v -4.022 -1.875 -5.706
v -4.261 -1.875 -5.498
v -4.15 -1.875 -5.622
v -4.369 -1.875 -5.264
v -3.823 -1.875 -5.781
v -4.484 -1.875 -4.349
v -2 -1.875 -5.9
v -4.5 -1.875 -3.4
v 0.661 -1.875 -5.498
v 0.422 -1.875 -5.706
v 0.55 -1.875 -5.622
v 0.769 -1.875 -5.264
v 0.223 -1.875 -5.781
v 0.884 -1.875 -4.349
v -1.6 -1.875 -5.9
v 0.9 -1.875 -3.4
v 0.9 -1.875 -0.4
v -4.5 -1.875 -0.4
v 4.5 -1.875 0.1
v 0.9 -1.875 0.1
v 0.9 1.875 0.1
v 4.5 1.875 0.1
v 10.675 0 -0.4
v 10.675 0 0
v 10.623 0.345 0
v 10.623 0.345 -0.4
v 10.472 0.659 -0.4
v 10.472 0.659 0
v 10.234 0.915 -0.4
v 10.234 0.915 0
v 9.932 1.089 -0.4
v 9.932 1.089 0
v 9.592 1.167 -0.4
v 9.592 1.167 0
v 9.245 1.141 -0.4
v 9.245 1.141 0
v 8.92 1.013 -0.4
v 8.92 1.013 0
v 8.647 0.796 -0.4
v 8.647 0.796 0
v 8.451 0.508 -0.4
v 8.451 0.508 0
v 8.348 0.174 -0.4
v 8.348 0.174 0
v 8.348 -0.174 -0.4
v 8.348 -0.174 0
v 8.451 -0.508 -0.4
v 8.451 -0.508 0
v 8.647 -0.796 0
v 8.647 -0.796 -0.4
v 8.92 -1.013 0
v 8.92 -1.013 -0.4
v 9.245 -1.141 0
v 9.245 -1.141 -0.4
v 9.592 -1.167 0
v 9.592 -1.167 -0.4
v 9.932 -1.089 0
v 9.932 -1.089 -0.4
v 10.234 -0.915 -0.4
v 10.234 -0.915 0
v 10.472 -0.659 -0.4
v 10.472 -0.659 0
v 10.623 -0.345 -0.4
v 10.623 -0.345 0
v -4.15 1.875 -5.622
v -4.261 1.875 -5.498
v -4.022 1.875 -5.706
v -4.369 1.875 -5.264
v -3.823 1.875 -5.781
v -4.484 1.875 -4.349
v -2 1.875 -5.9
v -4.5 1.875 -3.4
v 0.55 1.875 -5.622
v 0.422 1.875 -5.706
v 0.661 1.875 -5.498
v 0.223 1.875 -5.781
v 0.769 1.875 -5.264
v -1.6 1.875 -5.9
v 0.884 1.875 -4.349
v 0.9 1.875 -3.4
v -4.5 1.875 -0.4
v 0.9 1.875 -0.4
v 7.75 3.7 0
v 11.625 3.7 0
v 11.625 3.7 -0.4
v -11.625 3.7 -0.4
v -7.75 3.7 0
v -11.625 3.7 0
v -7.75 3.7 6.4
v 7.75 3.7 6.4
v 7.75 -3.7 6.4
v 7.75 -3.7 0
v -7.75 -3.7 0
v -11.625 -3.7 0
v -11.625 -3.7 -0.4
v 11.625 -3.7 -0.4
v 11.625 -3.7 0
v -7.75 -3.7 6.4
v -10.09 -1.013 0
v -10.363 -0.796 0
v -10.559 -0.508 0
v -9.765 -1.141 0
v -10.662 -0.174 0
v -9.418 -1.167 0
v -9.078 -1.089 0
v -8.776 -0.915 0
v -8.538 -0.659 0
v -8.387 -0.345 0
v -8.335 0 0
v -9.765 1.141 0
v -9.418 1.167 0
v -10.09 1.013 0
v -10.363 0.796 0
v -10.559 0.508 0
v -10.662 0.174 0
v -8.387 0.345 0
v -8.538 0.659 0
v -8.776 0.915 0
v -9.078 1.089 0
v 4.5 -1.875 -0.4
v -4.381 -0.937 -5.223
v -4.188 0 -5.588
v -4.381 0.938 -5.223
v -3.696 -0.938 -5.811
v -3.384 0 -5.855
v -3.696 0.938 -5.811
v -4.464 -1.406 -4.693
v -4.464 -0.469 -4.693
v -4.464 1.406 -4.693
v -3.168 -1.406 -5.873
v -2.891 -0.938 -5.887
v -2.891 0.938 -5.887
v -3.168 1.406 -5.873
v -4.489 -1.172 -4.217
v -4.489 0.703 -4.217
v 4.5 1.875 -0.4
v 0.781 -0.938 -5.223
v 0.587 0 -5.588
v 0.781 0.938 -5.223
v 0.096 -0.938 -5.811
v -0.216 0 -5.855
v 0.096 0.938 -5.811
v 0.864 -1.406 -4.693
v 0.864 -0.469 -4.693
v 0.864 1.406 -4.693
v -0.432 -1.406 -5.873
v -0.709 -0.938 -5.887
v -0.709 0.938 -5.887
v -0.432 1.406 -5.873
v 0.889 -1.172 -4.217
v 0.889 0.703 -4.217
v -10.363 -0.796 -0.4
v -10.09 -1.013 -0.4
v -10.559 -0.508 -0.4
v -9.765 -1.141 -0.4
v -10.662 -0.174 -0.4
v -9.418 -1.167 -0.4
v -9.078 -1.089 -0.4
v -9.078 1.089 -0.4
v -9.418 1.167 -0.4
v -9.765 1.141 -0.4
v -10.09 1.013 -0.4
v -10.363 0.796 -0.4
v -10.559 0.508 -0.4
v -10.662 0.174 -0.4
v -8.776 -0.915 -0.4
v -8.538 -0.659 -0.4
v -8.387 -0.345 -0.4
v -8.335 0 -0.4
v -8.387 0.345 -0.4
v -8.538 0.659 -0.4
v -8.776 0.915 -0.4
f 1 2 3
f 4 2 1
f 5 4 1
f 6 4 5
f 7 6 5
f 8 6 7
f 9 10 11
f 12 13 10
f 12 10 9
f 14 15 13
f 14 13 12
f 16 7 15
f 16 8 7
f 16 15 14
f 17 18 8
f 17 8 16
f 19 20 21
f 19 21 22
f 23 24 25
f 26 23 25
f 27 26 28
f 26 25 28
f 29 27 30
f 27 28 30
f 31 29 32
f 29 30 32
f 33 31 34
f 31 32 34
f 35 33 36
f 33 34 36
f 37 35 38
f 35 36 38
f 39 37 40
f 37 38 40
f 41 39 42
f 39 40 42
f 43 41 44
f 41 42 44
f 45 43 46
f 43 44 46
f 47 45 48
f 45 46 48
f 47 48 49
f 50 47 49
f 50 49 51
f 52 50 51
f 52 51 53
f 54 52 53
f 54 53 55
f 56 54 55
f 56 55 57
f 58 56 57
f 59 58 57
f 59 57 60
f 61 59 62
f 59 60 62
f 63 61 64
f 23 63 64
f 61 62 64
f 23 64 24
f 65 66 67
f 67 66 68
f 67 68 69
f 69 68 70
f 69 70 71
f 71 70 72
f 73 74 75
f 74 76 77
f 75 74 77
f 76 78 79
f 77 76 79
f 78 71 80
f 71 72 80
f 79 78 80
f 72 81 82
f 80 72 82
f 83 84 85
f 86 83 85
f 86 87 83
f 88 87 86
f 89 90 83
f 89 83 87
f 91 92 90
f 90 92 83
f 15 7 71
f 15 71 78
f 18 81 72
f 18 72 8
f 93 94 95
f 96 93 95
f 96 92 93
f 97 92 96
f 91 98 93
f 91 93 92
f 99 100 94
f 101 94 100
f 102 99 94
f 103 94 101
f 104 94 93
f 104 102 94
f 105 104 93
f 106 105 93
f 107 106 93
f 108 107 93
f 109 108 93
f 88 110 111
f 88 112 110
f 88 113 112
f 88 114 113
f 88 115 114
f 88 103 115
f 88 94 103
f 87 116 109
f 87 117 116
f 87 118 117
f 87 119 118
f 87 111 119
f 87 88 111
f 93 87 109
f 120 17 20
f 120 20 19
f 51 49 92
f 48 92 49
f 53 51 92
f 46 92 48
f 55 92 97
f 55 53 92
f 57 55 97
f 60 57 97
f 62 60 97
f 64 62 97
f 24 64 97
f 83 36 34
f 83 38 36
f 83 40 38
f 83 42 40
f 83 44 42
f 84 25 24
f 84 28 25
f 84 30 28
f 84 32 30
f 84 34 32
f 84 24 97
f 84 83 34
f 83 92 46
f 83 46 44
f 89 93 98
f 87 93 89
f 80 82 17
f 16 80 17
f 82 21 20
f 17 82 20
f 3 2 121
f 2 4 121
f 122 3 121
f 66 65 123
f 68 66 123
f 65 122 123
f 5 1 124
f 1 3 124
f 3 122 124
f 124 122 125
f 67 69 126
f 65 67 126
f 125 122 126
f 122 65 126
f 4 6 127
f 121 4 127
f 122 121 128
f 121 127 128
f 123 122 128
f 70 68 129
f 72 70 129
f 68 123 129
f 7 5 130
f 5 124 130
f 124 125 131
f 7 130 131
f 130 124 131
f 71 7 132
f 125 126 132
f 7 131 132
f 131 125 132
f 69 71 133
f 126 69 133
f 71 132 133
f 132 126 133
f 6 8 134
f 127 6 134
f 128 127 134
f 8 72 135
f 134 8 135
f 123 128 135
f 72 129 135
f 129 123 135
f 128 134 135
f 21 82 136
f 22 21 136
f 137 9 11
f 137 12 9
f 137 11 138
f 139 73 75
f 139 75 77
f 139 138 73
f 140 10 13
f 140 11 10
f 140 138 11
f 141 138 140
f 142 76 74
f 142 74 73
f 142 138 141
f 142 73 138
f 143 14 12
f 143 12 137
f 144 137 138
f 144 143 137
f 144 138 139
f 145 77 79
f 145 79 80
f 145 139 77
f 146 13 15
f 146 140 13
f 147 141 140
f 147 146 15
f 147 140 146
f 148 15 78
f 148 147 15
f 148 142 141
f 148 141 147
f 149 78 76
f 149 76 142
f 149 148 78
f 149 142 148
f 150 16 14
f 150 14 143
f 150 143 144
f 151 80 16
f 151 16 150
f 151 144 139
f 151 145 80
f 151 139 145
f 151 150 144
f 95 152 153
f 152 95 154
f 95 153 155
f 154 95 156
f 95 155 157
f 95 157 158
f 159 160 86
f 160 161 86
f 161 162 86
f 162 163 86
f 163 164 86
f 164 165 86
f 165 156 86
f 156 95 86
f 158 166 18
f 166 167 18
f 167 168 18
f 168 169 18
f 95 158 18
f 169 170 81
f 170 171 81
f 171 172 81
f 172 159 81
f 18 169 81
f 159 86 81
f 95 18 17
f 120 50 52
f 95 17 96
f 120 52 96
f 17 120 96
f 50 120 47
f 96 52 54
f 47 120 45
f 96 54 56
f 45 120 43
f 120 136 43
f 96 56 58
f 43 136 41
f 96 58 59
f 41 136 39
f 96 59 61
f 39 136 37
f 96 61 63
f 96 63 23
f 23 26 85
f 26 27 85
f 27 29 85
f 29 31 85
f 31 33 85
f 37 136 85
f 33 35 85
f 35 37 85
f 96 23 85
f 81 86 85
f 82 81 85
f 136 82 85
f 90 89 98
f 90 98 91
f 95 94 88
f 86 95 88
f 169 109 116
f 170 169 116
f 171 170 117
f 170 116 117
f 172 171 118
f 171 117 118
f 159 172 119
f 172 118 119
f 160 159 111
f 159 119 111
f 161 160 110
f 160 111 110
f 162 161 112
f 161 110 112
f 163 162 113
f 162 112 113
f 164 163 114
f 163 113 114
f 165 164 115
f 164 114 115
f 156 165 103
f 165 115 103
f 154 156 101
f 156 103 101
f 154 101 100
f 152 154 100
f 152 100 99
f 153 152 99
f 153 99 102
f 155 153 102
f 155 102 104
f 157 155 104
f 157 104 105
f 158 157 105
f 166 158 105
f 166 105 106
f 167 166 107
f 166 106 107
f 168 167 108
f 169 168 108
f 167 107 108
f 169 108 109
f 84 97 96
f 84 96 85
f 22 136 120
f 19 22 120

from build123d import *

# Parameters (mm, degrees)
F0_W        = 3.875
F0_H        = 7.4
F0_R        = 1.17
F0_W_2      = 15.5
F1_DEPTH    = 0.4
F2_DEPTH    = 6.4
F3_W        = 3.6
F3_H        = 3.75
F4_DEPTH    = 0.5
F3_W_2      = 5.4
F5_DEPTH    = 5.5
F6_T1_DEPTH = 16.25
F7_DEPTH    = 0.5


# Not quite as in the source:
# - a fillet or chamfer that OpenCascade refuses, or shapes differently, is made with other operations: its cross-section is extruded or revolved along the edge and cut away or added


with BuildPart() as f1:
    # F0 (on Top) → F1 (new body)
    with BuildSketch(Plane.XY):
        with Locations((-9.6875, 0)):
            Rectangle(F0_W, F0_H)
        with Locations((-9.505, 0)):
            Circle(F0_R, mode=Mode.SUBTRACT)
        Rectangle(F0_W_2, F0_H)
        with Locations((9.6875, 0)):
            Rectangle(F0_W, F0_H)
        with Locations((9.505, 0)):
            Circle(F0_R, mode=Mode.SUBTRACT)
    extrude(amount=-F1_DEPTH)

    # F0 (on Top) → F2 (join)
    with BuildSketch(Plane.XY):
        Rectangle(F0_W_2, F0_H)
    extrude(amount=F2_DEPTH)

    # F3 (on face) → F4 (cut)
    with BuildSketch(Plane(origin=(0, 0, -0.4), x_dir=(1, 0, 0), z_dir=(0, 0, -1))):
        with Locations((2.7, 0)):
            Rectangle(F3_W, F3_H)
    extrude(amount=-F4_DEPTH, mode=Mode.SUBTRACT)

    # F3 (on face) → F5 (join)
    with BuildSketch(Plane(origin=(0, 0, -0.4), x_dir=(1, 0, 0), z_dir=(0, 0, -1))):
        with Locations((-1.8, 0)):
            Rectangle(F3_W_2, F3_H)
    extrude(amount=F5_DEPTH)

    # F6: fillet of radius 2.5 on 2 edges, made by hand

    # F6_s2 → F6_t1 (cut)
    with BuildSketch(Plane.XZ.offset(-8.125)):
        with BuildLine():
            add(Edge.make_bspline(
                [(-4.5, -3.4), (-4.5, -5.9), (-2, -5.9)],
                knots=[0, 0, 0, 1, 1, 1], degree=2, weights=[1, 3, 1]))
            Line((-2, -5.9), (-4.5, -5.9))
            Line((-4.5, -5.9), (-4.5, -3.4))
        make_face()
        with BuildLine():
            add(Edge.make_bspline(
                [(0.9, -3.4), (0.9, -5.9), (-1.6, -5.9)],
                knots=[0, 0, 0, 1, 1, 1], degree=2, weights=[1, 3, 1]))
            Line((-1.6, -5.9), (0.9, -5.9))
            Line((0.9, -5.9), (0.9, -3.4))
        make_face()
    extrude(amount=F6_T1_DEPTH, mode=Mode.SUBTRACT)

    # F3 (on face) → F7 (cut)
    with BuildSketch(Plane(origin=(0, 0, -0.4), x_dir=(1, 0, 0), z_dir=(0, 0, -1))):
        with Locations((2.7, 0)):
            Rectangle(F3_W, F3_H)
    extrude(amount=-F7_DEPTH, mode=Mode.SUBTRACT)


solid = f1.part
